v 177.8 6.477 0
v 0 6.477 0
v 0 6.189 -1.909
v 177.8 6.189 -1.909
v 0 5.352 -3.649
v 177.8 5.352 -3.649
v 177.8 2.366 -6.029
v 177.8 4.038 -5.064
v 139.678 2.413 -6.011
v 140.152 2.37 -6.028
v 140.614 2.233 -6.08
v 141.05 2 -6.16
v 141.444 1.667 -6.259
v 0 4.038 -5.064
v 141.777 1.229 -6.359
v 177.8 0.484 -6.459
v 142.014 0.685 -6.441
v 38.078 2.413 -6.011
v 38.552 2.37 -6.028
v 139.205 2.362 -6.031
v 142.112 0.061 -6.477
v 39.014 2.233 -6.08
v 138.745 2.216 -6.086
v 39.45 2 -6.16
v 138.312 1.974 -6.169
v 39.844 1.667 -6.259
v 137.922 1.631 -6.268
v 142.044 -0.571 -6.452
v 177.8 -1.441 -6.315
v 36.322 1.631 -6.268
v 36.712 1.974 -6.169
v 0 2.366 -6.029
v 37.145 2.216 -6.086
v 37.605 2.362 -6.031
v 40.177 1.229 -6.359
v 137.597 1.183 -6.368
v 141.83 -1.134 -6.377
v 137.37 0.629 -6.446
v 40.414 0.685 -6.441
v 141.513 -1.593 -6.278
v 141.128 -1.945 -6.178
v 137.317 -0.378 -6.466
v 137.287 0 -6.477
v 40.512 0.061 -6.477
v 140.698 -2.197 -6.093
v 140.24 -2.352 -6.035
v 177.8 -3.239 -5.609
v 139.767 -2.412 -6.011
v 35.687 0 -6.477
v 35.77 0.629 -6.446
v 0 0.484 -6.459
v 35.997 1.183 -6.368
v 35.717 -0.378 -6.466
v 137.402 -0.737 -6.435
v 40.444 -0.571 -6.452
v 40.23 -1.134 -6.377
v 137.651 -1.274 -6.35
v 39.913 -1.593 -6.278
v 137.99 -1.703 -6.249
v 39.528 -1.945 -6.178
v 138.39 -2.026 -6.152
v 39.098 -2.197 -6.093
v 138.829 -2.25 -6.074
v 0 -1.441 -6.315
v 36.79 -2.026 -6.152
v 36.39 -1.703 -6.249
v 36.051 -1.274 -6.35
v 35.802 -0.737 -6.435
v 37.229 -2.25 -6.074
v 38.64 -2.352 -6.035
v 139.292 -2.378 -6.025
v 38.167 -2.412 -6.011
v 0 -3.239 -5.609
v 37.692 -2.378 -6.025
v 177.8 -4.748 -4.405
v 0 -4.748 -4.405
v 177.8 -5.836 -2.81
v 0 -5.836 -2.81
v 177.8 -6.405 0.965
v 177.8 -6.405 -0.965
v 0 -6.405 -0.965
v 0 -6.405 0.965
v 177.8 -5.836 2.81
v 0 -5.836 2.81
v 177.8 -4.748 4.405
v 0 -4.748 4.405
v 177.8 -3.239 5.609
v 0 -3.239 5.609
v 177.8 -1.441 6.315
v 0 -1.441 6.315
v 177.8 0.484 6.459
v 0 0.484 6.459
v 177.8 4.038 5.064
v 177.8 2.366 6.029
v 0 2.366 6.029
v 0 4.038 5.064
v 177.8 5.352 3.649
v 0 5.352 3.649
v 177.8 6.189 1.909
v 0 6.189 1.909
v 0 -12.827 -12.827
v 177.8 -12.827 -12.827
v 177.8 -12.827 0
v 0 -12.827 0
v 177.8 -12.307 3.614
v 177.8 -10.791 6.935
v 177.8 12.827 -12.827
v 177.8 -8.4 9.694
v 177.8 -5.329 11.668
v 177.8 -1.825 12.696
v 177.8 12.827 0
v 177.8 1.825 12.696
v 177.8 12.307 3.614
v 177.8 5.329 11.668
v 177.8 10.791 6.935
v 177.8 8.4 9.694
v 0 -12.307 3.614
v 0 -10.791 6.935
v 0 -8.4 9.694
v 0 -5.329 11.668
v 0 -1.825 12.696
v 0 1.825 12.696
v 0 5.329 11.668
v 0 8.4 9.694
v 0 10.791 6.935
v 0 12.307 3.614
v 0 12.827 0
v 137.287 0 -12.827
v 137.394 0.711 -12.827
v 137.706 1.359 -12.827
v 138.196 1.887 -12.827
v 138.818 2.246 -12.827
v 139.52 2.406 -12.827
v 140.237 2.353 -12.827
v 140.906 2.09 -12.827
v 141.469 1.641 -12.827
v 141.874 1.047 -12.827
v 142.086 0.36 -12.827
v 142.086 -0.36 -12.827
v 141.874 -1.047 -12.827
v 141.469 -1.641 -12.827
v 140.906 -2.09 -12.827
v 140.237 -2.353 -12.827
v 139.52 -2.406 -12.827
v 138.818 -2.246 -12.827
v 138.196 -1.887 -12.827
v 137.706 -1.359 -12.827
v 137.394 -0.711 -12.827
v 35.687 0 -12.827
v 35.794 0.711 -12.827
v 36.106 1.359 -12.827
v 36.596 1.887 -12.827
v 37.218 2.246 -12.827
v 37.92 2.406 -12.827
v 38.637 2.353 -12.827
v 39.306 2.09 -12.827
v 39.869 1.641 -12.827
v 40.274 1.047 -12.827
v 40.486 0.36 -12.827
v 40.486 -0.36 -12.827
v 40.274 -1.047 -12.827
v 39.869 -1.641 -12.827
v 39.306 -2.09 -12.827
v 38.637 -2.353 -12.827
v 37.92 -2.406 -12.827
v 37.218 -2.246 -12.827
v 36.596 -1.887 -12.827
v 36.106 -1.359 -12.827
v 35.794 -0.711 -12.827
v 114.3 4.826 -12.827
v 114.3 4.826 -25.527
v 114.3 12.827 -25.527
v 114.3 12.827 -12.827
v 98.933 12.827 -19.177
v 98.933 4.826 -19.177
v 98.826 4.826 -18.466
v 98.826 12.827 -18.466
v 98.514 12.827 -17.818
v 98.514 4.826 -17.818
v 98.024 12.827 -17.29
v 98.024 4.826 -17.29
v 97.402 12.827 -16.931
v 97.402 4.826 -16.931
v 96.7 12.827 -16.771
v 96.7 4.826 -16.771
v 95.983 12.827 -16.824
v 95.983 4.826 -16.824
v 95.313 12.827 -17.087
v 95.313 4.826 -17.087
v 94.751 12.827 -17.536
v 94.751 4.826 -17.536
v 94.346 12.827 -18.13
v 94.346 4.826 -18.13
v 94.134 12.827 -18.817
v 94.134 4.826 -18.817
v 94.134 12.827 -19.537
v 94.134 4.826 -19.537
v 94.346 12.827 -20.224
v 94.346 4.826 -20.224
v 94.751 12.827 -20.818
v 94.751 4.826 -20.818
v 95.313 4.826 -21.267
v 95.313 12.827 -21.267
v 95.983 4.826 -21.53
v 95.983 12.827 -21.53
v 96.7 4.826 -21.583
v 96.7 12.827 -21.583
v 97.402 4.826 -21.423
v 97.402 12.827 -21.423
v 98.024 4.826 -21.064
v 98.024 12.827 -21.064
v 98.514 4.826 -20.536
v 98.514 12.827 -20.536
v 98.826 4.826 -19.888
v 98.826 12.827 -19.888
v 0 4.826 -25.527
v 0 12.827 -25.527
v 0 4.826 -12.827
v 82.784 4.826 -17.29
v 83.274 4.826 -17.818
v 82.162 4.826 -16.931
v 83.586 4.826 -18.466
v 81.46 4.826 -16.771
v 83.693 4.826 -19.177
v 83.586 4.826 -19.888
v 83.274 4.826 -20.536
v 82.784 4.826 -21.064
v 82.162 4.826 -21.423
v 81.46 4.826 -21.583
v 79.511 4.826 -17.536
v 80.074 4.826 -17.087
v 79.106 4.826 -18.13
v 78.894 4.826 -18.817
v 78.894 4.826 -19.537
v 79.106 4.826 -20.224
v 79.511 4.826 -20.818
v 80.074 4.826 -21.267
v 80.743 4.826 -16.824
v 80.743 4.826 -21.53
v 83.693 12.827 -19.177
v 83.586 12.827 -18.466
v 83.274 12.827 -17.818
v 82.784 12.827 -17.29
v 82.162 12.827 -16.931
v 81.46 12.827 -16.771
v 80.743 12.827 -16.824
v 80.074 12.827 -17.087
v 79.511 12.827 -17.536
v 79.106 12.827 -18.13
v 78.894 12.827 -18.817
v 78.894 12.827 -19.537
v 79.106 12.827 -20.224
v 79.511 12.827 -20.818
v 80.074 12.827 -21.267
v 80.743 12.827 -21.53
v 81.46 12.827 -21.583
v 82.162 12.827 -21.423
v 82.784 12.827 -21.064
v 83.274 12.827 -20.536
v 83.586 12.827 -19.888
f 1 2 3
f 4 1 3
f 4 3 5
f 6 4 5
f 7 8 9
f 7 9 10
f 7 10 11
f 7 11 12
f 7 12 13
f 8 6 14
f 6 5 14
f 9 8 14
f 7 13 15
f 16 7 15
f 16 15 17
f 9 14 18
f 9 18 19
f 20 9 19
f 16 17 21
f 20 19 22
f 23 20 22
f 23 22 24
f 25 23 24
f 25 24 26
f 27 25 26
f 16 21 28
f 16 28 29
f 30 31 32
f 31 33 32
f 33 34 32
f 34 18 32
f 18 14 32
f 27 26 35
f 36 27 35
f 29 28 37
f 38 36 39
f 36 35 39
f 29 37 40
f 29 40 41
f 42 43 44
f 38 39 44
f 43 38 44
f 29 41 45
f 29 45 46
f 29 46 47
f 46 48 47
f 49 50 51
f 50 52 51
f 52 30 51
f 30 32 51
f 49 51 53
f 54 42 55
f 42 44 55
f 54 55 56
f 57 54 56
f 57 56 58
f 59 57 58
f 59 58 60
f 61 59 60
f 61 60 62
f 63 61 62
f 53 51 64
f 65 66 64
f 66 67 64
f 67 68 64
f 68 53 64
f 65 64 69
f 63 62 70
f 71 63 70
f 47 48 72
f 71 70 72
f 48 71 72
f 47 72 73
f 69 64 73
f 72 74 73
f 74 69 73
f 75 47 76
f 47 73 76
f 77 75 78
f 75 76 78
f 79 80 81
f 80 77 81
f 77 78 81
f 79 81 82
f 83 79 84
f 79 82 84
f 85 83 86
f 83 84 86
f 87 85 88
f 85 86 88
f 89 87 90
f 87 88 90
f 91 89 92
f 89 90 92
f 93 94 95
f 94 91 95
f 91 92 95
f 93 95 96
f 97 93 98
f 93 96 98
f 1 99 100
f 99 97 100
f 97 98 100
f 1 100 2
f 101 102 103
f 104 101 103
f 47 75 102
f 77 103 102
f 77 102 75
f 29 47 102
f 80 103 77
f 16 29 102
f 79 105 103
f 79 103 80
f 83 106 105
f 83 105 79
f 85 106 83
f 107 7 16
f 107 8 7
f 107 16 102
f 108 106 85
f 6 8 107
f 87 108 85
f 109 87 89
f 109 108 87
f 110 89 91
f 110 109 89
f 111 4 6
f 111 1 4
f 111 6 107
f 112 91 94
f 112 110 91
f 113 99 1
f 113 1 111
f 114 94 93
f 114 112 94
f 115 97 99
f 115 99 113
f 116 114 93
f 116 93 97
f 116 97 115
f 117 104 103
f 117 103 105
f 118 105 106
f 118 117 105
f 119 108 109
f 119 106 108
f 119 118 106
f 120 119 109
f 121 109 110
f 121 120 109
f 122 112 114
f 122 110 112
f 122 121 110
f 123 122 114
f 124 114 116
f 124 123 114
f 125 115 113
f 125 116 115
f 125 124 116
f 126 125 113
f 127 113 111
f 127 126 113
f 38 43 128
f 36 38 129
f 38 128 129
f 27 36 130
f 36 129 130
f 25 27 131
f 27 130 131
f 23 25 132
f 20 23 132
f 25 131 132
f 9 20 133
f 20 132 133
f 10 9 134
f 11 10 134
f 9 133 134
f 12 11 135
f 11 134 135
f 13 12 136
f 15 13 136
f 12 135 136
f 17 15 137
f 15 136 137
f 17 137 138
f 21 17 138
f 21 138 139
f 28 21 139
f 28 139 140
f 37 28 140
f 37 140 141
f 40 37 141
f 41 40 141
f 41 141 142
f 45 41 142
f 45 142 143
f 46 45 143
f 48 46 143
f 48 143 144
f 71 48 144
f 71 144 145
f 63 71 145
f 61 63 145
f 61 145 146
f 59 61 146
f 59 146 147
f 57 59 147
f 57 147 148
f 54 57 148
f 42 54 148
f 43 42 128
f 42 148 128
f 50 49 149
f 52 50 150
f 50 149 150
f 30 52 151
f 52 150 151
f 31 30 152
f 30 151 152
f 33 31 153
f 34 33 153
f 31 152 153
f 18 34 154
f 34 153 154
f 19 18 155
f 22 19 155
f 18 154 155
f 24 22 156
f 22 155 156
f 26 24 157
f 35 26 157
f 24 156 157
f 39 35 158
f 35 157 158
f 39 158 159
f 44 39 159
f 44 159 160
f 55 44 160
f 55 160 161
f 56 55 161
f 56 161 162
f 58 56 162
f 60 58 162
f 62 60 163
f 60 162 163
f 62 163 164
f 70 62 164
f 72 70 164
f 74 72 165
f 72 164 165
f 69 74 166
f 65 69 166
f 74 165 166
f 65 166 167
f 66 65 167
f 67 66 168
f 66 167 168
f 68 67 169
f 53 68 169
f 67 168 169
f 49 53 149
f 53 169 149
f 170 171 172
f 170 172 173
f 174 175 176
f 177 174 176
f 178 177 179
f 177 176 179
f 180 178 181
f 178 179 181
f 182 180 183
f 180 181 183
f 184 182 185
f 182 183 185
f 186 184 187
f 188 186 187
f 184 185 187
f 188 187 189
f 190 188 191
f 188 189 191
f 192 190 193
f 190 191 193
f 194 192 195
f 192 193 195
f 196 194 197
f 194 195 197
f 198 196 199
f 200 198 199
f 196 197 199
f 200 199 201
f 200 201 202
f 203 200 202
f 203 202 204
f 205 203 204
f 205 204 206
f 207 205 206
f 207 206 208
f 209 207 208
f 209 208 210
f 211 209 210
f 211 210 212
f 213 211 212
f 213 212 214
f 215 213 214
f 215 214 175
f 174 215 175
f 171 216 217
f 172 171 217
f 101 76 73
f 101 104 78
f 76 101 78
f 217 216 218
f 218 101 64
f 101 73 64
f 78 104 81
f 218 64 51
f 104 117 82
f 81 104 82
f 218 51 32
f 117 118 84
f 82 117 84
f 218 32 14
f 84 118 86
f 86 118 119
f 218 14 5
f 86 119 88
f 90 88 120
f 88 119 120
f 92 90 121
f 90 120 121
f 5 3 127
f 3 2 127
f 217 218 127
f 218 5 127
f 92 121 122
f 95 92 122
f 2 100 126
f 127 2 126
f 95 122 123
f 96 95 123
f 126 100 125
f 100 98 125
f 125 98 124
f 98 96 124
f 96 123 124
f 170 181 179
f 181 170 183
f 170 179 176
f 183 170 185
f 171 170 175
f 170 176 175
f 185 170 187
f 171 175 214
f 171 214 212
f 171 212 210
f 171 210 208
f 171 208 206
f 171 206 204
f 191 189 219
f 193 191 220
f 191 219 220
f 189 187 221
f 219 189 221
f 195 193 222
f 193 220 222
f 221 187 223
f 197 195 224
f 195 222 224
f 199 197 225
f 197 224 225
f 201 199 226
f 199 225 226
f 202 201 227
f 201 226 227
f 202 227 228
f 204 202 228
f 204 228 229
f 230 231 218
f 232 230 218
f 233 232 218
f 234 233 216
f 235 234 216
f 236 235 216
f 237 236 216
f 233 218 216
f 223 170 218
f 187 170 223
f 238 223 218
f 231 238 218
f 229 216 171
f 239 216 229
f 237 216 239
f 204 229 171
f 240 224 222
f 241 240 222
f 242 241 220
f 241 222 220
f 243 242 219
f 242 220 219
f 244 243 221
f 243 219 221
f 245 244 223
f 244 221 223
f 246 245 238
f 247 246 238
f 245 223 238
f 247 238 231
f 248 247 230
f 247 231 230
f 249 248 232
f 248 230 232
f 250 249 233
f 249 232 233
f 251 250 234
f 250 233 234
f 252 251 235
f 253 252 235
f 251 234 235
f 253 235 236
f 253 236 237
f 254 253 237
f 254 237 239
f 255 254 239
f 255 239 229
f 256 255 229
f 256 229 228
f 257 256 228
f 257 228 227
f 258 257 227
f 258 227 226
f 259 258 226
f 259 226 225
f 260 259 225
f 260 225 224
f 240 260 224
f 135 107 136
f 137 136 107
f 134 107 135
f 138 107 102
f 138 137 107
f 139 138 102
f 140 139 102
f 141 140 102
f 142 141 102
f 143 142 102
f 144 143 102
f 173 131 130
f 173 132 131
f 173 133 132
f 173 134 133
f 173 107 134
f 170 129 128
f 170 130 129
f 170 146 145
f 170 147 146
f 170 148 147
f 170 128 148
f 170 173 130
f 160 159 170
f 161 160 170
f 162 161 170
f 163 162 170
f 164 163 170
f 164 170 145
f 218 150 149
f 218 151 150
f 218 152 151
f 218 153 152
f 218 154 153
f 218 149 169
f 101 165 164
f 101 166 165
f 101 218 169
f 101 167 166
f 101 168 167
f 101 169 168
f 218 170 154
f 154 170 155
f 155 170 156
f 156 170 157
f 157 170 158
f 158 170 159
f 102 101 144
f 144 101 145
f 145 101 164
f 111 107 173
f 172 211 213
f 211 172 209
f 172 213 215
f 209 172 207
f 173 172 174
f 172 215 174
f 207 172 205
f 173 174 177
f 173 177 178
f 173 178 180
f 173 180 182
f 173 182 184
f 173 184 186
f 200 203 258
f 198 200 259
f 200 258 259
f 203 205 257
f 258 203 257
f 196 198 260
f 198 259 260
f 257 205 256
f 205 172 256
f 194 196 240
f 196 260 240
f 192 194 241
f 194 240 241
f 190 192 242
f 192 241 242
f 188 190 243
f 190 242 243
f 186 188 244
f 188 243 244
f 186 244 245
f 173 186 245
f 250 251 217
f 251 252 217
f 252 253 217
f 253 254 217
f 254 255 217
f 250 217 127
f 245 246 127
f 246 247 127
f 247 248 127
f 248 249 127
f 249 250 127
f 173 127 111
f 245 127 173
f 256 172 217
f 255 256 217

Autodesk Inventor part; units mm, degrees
ref_plane "YZ Plane" through (0, 0, 0) normal (1, 0, 0) x (0, 1, 0)
ref_plane "XZ Plane" through (0, 0, 0) normal (0, 1, 0) x (-1, 0, 0)
ref_plane "XY Plane" through (0, 0, 0) normal (0, 0, 1) x (1, 0, 0)
sketch "Sketch1" plane through (0, 0, 0) normal (1, 0, 0) x (0, 1, 0)
  circle A0 centre (0, 0) radius 6.477
  circle A1 centre (0, 0) radius 12.827
  dimension "connector_inner_width" = 12.954
  dimension "connector_outerdiam" = 25.654
extrude "Extrusion1" add sketch "Sketch1" along normal blind 177.8
ref_plane "Work Plane1" through (88.9, 0, 0) normal (-1, 0, 0) x (0, 0, 1)
sketch "Sketch2" plane through (0, 0, 0) normal (-1, 0, 0) x (0, 0, 1)
  circle A0 centre (0, 0) radius 12.827 projected
  arc A1 (0, -12.827) -> (0, 12.827) centre (0, 0) ccw construction
  line L0 (-12.827, 0) -> (-12.827, 4.826)
  line L1 (-12.827, 4.826) -> (-25.527, 4.826)
  line L2 (-12.827, 4.826) -> (-12.827, 12.827) construction
  line L3 (-12.827, 0) -> (-12.827, -12.827)
  line L4 (-12.827, -12.827) -> (0, -12.827)
  line L5 (-12.827, 12.827) -> (0, 12.827)
  line L6 (-25.527, 4.826) -> (-25.527, 12.827)
  line L7 (-25.527, 12.827) -> (-12.827, 12.827)
  arc A2 (-12.827, 0) -> (0, -12.827) centre (0, 0) ccw
  arc A3 (0, 12.827) -> (-12.827, 0) centre (0, 0) ccw
  point P0 (-12.827, 0)
  point P1 (-12.827, 0)
  point P2 (0, -12.827)
  dimension "conector_tower_connection_thickness" = 4.826
  dimension "d5" = 12.7
extrude "Extrusion2" add sketch "Sketch2" against normal blind 177.8 contours A0 L0 L1 L6 L7 L5 | L4 L3 A0
sketch "Sketch3" plane through (0, 4.826, -25.527) normal (0, -1, 0) x (1, 0, 0)
  line L0 (0, 12.7) -> (177.8, 12.7) projected
  line L1 (0, 0) -> (177.8, 0) projected
  line L2 (88.9, 0) -> (88.9, 12.7) construction
  line L3 (88.9, 0) -> (88.9, 12.7) construction
  line L4 (88.9, 6.35) -> (96.52, 6.35) construction
  circle A0 centre (96.52, 6.35) radius 2.413
  line L5 (88.9, 6.35) -> (81.28, 6.35) construction
  circle A1 centre (81.28, 6.35) radius 2.413
  point P0 (0, 25.527)
  dimension "d8" = 7.62
  dimension "d9" = 4.826
extrude "Extrusion3" cut sketch "Sketch3" against normal through all
sketch "Sketch4" plane through (0, -12.827, -12.827) normal (0, 0, -1) x (-1, 0, 0)
  line L0 (0, 0) -> (-177.8, 0) projected
  line L1 (0, 17.653) -> (-177.8, 17.653) projected
  line L2 (-88.9, 8.9535) -> (-38.1, 8.9535) construction
  line L3 (-177.8, 6.35) -> (-177.8, 19.304) projected
  line L4 (-177.8, 12.827) -> (0, 12.827) construction
  line L5 (-88.9, 12.827) -> (-139.7, 12.827)
  circle A0 centre (-139.7, 12.827) radius 2.413
  line L6 (-88.9, 0) -> (-88.9, 17.653) construction
  circle A1 centre (-38.1, 12.827) radius 2.413
  dimension "d14" = 50.8
  dimension "d15" = 4.826
extrude "Extrusion4" cut sketch "Sketch4" against normal blind 12.7
sketch "Sketch5" plane through (0, 4.826, -25.527) normal (0, -1, 0) x (1, 0, 0)
  line L0 (0, 12.7) -> (177.8, 12.7) projected
  line L1 (177.8, 12.7) -> (177.8, 0) projected
  line L2 (0, 0) -> (177.8, 0) projected
  circle A0 centre (96.52, 6.35) radius 2.413 projected
  line L3 (177.8, 0) -> (114.3, 0)
  line L4 (114.3, 0) -> (114.3, 12.7)
  line L5 (114.3, 12.7) -> (177.8, 12.7)
  point P0 (0, 25.527)
  dimension "d18" = 63.5
extrude "Extrusion5" cut sketch "Sketch5" against normal blind 12.7 contours L0 L1 L2 L4
equation "\"d6\" = connector_width"
equation "\"connector_width\" = 177.8"
properties part number "arm_connector"
